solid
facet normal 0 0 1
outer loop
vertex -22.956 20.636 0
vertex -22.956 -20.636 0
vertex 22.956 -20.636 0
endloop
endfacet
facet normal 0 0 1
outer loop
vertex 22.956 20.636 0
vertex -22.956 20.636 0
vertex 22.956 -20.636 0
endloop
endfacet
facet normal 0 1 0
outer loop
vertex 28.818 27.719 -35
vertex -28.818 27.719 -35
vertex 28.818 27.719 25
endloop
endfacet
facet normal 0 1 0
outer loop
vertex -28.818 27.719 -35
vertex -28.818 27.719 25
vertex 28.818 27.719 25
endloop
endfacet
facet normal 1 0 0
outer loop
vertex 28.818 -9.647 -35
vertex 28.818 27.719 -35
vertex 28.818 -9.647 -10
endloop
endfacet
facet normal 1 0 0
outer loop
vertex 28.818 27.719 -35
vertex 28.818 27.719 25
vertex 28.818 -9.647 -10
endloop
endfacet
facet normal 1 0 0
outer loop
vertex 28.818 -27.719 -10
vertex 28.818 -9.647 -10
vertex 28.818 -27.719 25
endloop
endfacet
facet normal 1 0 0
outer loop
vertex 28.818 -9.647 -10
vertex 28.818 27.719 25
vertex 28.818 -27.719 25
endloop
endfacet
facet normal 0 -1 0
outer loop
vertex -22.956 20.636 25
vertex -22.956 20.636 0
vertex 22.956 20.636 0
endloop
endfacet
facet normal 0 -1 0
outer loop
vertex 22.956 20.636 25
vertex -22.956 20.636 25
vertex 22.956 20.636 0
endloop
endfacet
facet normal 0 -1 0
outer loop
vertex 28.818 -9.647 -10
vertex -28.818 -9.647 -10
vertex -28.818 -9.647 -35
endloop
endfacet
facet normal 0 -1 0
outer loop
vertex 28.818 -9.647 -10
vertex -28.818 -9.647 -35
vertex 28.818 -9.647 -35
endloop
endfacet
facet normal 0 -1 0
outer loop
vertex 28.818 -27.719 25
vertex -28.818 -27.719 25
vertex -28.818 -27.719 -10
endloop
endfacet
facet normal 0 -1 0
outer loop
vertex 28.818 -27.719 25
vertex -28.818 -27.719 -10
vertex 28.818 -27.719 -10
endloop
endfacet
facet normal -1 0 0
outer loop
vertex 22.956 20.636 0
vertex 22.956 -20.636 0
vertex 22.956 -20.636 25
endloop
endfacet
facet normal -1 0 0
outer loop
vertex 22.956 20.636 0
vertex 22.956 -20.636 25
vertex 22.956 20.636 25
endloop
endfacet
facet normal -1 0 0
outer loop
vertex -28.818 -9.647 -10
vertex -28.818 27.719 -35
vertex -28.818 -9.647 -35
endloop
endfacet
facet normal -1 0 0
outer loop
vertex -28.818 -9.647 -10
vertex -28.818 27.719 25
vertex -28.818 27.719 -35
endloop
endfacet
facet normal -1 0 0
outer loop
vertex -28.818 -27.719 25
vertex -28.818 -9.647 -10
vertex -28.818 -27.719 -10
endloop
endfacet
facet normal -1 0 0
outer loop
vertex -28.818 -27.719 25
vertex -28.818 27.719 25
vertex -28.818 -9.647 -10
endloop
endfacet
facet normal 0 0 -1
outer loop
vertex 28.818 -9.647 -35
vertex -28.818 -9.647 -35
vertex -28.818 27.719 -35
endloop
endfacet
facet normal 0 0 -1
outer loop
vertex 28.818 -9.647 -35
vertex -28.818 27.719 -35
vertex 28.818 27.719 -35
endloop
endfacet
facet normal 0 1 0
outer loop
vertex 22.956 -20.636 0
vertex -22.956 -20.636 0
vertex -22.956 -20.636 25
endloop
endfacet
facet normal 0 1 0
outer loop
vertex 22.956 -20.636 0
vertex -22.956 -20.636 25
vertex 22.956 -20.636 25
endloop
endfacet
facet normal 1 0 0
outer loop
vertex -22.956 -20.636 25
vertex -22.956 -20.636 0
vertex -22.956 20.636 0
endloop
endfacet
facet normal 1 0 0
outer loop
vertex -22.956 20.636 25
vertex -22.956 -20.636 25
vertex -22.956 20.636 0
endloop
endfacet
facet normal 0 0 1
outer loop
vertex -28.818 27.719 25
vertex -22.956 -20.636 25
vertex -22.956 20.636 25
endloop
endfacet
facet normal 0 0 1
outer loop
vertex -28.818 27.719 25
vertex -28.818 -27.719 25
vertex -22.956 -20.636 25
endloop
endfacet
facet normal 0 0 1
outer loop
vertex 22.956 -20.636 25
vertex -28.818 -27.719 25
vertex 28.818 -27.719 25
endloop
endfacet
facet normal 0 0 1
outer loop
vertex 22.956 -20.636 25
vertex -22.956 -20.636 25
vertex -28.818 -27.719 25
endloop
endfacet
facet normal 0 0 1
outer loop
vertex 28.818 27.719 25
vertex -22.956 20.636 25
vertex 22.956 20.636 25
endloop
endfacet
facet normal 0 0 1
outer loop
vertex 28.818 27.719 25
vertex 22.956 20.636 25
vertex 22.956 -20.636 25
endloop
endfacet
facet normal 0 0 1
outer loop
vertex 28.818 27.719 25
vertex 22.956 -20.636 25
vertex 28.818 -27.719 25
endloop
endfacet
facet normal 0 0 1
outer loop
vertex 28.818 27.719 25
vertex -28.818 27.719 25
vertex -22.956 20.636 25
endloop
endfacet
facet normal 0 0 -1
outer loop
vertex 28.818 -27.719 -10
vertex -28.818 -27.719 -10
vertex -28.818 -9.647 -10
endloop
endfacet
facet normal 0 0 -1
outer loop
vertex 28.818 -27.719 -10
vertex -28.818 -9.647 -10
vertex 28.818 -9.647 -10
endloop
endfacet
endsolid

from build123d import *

# Parameters (mm, degrees)
F0_W     = 57.635396
F0_H     = 55.43743
F0_W_2   = 45.91294
F0_H_2   = 41.272804
F1_DEPTH = 25
F2_W     = 57.635396
F2_H     = 55.43743
F3_DEPTH = 10
F4_W     = 57.635396
F4_H     = 37.36532
F5_DEPTH = 25


with BuildPart() as f1:
    # F0 (on Top) → F1 (new body)
    with BuildSketch(Plane.XY):
        Rectangle(F0_W, F0_H)
        Rectangle(F0_W_2, F0_H_2, mode=Mode.SUBTRACT)
    extrude(amount=F1_DEPTH)

    # F2 (on face) → F3 (join)
    with BuildSketch(Plane(origin=(0, 0, 0), x_dir=(1, 0, 0), z_dir=(0, 0, -1))):
        Rectangle(F2_W, F2_H)
    extrude(amount=F3_DEPTH)

    # F4 (on face) → F5 (join)
    with BuildSketch(Plane(origin=(0, 0, -10), x_dir=(1, 0, 0), z_dir=(0, 0, -1))):
        with Locations((0, -9.036055)):
            Rectangle(F4_W, F4_H)
    extrude(amount=F5_DEPTH)


solid = f1.part
